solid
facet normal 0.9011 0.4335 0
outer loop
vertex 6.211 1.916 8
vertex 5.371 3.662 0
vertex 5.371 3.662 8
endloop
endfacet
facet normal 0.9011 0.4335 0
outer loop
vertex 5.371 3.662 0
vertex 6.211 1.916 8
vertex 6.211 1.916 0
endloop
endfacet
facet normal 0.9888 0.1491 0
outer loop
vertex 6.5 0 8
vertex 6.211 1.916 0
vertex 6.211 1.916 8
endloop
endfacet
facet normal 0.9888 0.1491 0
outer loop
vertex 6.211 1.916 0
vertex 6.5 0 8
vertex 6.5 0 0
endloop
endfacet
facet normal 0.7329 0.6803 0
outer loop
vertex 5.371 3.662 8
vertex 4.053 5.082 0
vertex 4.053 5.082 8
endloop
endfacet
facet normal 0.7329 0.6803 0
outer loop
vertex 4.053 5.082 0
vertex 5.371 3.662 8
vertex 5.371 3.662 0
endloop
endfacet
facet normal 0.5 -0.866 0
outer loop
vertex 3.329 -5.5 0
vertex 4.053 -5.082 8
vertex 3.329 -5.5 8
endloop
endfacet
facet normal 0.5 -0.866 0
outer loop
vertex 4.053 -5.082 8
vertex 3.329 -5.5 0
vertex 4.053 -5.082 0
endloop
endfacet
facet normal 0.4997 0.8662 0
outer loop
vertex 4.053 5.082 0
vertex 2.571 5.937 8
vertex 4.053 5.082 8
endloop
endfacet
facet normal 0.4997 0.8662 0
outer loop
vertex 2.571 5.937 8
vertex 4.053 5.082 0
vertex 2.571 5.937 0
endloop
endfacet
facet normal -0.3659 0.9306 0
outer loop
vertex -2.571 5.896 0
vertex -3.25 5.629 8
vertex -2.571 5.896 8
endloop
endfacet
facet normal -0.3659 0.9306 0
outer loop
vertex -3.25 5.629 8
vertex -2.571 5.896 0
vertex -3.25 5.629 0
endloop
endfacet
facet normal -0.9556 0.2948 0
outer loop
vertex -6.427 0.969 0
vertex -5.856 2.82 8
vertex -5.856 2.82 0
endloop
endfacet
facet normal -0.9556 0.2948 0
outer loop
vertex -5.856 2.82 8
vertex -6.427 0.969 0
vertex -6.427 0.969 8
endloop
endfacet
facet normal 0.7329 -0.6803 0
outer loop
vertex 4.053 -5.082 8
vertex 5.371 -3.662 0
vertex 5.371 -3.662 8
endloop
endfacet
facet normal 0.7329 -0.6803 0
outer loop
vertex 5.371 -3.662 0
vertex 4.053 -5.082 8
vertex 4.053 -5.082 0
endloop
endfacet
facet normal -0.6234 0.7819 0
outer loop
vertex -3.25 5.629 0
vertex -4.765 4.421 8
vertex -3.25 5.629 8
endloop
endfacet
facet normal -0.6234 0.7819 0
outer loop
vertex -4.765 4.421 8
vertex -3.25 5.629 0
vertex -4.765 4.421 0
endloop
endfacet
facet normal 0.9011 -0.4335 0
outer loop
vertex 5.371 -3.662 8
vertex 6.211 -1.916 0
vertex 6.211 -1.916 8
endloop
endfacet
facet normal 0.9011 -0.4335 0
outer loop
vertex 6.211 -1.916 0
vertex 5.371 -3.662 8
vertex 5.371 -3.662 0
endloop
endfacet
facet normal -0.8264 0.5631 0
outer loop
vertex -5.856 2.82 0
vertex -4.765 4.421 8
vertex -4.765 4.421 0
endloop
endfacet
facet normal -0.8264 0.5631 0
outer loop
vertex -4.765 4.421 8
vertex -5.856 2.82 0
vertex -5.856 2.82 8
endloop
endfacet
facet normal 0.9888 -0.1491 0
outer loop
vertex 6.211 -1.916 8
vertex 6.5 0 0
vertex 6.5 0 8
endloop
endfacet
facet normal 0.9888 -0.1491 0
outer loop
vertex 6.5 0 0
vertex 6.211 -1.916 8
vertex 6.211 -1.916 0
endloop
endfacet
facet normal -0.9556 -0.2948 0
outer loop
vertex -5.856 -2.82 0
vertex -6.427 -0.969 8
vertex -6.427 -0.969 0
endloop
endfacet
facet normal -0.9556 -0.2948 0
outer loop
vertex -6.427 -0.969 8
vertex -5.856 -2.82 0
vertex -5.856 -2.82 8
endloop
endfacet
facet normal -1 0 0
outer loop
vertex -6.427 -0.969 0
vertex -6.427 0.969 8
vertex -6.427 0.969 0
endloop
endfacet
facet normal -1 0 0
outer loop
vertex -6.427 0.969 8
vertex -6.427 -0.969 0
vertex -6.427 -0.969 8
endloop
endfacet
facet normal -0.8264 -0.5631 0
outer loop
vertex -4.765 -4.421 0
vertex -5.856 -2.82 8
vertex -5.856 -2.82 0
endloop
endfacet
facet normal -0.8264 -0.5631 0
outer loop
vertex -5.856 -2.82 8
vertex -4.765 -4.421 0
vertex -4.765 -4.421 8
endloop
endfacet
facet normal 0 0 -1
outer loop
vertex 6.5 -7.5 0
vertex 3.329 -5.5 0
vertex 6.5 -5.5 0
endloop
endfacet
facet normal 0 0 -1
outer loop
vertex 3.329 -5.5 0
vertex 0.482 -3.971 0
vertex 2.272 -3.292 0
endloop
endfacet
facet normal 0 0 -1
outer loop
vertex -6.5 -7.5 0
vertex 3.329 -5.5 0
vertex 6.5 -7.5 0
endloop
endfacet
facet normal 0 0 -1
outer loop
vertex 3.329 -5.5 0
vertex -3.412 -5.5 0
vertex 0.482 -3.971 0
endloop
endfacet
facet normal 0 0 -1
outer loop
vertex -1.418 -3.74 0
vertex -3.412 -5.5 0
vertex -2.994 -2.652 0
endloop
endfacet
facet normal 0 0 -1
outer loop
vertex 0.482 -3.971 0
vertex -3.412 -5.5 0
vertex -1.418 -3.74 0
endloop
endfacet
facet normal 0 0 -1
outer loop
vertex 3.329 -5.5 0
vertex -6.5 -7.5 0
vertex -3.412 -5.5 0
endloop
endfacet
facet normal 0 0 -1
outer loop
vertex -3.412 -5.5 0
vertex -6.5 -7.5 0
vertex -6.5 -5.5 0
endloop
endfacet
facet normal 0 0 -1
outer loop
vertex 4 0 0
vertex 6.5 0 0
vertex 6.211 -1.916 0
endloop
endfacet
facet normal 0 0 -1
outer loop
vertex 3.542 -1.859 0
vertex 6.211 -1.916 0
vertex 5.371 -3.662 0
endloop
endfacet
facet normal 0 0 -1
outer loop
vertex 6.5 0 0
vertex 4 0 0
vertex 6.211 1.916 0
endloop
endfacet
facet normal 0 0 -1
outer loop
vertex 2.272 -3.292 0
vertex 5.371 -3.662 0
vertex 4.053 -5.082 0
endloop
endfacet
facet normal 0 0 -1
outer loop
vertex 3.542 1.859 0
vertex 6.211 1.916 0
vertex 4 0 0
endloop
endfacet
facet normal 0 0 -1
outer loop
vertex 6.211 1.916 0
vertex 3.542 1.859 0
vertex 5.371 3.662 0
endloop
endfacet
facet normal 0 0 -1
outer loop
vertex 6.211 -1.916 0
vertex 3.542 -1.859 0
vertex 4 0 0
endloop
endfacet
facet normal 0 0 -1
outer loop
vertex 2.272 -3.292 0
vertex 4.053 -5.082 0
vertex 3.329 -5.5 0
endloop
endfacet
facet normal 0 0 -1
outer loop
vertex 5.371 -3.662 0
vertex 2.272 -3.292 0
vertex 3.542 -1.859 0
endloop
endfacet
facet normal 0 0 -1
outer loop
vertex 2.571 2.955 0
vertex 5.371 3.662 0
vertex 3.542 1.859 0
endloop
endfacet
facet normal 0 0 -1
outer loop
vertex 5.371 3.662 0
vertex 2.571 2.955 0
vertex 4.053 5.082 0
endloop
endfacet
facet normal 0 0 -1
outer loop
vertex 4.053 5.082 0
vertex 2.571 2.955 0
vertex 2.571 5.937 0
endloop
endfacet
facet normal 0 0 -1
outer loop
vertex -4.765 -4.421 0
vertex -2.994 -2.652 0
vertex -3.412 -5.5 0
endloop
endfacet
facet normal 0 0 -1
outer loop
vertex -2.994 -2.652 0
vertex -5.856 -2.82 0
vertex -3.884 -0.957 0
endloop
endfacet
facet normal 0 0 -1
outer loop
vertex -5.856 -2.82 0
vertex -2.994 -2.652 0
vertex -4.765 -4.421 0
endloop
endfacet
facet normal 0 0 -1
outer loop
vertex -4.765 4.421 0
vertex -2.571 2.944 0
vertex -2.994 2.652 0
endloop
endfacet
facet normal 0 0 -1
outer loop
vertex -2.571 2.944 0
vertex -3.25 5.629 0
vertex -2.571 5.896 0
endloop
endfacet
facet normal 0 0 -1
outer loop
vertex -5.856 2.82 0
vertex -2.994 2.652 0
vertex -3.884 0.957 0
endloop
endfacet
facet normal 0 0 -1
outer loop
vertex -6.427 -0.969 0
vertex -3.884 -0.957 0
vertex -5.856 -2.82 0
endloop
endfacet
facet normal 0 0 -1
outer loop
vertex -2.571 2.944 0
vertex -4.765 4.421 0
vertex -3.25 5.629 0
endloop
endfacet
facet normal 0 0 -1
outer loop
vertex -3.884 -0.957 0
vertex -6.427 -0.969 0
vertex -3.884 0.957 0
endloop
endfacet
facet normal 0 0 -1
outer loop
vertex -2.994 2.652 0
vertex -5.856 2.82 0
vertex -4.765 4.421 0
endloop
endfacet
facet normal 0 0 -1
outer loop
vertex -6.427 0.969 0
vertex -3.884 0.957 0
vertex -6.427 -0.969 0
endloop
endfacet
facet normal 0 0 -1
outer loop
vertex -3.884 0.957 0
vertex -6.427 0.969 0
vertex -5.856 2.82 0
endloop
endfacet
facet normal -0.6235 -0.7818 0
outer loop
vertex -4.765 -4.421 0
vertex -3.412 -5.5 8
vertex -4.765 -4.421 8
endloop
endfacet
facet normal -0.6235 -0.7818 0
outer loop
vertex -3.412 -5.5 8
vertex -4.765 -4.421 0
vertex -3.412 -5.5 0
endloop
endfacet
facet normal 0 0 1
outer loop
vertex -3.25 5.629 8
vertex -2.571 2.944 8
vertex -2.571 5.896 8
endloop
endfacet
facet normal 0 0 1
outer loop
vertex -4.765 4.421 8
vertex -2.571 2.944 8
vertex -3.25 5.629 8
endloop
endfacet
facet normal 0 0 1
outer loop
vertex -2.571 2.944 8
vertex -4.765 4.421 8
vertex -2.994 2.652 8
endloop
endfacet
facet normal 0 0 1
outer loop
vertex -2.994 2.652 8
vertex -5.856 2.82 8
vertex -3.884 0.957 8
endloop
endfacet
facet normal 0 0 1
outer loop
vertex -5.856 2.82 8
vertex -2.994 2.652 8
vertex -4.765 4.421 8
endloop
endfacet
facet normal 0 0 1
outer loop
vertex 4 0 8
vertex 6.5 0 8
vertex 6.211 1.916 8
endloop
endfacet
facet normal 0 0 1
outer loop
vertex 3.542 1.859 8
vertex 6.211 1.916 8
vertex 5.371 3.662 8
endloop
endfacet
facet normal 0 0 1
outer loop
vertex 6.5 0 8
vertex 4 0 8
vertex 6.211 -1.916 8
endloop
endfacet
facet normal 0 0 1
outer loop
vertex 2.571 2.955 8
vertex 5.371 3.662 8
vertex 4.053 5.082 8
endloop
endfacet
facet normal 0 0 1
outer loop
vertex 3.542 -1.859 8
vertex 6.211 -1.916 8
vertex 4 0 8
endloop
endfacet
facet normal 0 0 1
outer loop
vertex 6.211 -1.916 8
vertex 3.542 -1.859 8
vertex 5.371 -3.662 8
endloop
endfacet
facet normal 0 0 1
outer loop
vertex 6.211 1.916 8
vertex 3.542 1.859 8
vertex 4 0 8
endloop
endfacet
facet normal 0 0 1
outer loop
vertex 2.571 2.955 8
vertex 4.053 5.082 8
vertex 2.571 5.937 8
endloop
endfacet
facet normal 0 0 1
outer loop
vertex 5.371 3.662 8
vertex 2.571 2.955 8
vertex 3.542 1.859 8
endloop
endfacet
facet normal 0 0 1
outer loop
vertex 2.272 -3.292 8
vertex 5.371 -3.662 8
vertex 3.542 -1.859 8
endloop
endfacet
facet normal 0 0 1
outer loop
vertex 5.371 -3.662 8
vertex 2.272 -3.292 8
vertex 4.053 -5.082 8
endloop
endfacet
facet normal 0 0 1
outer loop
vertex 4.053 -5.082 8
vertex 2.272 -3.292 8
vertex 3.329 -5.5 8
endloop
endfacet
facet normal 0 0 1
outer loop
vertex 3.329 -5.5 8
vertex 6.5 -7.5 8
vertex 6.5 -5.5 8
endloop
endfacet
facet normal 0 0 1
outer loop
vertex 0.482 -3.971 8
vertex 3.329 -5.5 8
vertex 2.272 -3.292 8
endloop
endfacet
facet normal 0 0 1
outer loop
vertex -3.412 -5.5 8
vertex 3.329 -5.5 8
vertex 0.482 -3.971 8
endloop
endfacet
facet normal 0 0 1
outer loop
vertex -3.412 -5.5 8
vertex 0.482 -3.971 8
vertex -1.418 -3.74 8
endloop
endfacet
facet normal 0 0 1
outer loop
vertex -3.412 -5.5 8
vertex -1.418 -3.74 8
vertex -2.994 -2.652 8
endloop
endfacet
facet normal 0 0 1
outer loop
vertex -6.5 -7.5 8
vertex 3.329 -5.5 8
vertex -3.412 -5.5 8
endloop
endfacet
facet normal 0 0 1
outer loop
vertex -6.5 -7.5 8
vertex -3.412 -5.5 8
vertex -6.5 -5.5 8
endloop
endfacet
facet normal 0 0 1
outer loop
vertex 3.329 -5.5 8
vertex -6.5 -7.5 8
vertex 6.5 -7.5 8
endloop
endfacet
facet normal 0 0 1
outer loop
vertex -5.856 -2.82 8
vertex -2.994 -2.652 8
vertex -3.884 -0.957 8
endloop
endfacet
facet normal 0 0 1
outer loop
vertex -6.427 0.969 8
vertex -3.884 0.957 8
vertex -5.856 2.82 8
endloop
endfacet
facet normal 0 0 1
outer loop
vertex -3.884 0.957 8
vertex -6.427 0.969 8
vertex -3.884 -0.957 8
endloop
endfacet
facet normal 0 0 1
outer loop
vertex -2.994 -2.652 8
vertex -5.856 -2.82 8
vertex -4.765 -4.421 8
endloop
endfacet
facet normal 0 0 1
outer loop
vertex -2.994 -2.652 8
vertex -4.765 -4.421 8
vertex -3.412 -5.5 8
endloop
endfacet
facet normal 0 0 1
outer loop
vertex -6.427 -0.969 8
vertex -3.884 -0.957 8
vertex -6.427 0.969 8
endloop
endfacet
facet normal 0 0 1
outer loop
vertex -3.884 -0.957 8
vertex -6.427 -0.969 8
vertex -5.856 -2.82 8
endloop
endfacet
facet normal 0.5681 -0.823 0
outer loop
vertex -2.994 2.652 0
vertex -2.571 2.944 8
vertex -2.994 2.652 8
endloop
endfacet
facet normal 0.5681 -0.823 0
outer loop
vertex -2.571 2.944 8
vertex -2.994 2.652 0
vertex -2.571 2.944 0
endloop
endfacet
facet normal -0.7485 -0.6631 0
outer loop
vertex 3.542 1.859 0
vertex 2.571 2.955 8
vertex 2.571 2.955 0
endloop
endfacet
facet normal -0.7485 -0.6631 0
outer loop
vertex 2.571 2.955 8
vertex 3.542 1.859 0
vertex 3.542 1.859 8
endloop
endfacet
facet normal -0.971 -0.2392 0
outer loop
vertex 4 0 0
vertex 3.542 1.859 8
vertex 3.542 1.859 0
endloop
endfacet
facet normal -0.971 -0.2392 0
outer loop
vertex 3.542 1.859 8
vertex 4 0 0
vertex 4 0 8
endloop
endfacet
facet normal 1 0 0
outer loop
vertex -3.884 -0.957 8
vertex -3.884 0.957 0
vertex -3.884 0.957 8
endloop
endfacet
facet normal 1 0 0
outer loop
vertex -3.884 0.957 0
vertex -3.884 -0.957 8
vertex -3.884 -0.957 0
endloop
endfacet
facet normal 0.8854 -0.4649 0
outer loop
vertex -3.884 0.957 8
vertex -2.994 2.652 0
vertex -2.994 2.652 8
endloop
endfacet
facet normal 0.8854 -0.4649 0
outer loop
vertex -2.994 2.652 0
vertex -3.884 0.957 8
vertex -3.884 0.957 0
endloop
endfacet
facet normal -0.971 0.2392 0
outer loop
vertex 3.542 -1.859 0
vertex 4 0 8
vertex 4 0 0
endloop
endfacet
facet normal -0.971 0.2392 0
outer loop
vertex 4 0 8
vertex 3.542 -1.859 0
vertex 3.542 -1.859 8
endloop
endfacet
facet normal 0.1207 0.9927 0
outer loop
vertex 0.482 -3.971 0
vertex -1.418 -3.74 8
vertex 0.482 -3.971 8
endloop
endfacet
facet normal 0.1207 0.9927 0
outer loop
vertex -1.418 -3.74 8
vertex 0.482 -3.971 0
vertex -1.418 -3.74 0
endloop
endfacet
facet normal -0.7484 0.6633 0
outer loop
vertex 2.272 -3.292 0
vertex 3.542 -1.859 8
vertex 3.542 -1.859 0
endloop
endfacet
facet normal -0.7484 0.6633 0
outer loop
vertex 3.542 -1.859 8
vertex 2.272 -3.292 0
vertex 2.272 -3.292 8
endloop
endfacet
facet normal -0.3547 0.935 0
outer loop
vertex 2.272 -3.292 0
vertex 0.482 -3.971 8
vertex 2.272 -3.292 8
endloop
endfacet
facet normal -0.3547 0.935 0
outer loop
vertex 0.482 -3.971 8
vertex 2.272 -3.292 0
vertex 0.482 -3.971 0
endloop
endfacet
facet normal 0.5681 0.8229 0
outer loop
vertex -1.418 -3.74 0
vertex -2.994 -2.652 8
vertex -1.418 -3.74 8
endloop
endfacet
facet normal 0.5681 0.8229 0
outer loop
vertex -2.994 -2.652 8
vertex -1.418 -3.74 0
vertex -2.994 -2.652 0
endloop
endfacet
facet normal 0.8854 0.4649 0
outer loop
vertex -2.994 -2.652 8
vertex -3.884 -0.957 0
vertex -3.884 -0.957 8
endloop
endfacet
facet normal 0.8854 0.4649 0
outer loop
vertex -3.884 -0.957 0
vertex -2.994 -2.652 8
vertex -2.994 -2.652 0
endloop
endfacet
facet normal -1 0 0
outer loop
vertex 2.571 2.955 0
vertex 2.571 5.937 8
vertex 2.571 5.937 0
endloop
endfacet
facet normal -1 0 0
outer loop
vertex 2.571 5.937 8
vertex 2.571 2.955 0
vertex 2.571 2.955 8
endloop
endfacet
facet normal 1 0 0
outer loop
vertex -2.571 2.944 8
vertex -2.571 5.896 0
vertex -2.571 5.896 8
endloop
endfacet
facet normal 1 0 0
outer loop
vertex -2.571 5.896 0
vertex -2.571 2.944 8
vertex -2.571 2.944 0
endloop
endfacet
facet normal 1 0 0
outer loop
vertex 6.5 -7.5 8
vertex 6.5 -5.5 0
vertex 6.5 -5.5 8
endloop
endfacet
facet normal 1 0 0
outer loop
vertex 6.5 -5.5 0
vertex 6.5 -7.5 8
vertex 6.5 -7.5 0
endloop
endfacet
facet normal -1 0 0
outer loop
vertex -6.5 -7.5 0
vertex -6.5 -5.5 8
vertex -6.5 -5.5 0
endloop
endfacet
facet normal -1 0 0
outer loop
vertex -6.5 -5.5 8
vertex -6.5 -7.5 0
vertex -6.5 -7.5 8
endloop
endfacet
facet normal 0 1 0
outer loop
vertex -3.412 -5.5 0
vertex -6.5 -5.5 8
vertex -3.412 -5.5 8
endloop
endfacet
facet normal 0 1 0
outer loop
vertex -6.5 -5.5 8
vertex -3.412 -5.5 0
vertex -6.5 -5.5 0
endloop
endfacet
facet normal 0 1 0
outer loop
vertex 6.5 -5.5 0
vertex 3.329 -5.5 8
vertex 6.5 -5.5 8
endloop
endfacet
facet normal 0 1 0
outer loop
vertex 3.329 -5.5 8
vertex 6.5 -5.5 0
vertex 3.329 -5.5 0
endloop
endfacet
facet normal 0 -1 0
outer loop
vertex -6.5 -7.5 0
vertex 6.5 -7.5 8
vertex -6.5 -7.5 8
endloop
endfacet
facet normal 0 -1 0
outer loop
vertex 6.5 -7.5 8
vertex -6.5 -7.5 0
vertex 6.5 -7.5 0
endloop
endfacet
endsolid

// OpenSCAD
//-----------------------------------------------------------------
//-  Prusa decorators clamp
//--  (c) Juan Gonzalez Gomez (Obijuan) juan@iearobotics.com, 
//--  March 2012
//-----------------------------------------------------------------
//-- Glue this clamp to other objects so that you can put them
//-- in your Prusa threaded rods, for decorating your 3D printer!
//-- You can glue it easily using acetone
//-------------------------------------------------------------------

//-- Clamp parameters
rod_diam = 8;
clamp_diam = rod_diam + 5;
open_angle = 80;
width = 8;
base_lx = clamp_diam;
base_ly = 2;
base_lz = width;

//-- Internal parameters
open_x = 2*(rod_diam/2)*sin(open_angle/2);

module Prusa_clamp() 
{
  union() {

    //-- Clamp
    difference() {
      //-- outer cylinder
      cylinder(r=clamp_diam/2, h=width);

      //-- Inner cylinder
      cylinder(r=rod_diam/2, h=width+10,center=true);

      //-- Break the ring substracting a cube
      translate([-open_x/2,0,-1])
      cube([open_x, clamp_diam+10, width+2]);
    }

    //-- clamp Base
    translate([0,-clamp_diam/2,base_lz/2])
    cube([base_lx, base_ly, base_lz], center=true);
  }
}

Prusa_clamp();
